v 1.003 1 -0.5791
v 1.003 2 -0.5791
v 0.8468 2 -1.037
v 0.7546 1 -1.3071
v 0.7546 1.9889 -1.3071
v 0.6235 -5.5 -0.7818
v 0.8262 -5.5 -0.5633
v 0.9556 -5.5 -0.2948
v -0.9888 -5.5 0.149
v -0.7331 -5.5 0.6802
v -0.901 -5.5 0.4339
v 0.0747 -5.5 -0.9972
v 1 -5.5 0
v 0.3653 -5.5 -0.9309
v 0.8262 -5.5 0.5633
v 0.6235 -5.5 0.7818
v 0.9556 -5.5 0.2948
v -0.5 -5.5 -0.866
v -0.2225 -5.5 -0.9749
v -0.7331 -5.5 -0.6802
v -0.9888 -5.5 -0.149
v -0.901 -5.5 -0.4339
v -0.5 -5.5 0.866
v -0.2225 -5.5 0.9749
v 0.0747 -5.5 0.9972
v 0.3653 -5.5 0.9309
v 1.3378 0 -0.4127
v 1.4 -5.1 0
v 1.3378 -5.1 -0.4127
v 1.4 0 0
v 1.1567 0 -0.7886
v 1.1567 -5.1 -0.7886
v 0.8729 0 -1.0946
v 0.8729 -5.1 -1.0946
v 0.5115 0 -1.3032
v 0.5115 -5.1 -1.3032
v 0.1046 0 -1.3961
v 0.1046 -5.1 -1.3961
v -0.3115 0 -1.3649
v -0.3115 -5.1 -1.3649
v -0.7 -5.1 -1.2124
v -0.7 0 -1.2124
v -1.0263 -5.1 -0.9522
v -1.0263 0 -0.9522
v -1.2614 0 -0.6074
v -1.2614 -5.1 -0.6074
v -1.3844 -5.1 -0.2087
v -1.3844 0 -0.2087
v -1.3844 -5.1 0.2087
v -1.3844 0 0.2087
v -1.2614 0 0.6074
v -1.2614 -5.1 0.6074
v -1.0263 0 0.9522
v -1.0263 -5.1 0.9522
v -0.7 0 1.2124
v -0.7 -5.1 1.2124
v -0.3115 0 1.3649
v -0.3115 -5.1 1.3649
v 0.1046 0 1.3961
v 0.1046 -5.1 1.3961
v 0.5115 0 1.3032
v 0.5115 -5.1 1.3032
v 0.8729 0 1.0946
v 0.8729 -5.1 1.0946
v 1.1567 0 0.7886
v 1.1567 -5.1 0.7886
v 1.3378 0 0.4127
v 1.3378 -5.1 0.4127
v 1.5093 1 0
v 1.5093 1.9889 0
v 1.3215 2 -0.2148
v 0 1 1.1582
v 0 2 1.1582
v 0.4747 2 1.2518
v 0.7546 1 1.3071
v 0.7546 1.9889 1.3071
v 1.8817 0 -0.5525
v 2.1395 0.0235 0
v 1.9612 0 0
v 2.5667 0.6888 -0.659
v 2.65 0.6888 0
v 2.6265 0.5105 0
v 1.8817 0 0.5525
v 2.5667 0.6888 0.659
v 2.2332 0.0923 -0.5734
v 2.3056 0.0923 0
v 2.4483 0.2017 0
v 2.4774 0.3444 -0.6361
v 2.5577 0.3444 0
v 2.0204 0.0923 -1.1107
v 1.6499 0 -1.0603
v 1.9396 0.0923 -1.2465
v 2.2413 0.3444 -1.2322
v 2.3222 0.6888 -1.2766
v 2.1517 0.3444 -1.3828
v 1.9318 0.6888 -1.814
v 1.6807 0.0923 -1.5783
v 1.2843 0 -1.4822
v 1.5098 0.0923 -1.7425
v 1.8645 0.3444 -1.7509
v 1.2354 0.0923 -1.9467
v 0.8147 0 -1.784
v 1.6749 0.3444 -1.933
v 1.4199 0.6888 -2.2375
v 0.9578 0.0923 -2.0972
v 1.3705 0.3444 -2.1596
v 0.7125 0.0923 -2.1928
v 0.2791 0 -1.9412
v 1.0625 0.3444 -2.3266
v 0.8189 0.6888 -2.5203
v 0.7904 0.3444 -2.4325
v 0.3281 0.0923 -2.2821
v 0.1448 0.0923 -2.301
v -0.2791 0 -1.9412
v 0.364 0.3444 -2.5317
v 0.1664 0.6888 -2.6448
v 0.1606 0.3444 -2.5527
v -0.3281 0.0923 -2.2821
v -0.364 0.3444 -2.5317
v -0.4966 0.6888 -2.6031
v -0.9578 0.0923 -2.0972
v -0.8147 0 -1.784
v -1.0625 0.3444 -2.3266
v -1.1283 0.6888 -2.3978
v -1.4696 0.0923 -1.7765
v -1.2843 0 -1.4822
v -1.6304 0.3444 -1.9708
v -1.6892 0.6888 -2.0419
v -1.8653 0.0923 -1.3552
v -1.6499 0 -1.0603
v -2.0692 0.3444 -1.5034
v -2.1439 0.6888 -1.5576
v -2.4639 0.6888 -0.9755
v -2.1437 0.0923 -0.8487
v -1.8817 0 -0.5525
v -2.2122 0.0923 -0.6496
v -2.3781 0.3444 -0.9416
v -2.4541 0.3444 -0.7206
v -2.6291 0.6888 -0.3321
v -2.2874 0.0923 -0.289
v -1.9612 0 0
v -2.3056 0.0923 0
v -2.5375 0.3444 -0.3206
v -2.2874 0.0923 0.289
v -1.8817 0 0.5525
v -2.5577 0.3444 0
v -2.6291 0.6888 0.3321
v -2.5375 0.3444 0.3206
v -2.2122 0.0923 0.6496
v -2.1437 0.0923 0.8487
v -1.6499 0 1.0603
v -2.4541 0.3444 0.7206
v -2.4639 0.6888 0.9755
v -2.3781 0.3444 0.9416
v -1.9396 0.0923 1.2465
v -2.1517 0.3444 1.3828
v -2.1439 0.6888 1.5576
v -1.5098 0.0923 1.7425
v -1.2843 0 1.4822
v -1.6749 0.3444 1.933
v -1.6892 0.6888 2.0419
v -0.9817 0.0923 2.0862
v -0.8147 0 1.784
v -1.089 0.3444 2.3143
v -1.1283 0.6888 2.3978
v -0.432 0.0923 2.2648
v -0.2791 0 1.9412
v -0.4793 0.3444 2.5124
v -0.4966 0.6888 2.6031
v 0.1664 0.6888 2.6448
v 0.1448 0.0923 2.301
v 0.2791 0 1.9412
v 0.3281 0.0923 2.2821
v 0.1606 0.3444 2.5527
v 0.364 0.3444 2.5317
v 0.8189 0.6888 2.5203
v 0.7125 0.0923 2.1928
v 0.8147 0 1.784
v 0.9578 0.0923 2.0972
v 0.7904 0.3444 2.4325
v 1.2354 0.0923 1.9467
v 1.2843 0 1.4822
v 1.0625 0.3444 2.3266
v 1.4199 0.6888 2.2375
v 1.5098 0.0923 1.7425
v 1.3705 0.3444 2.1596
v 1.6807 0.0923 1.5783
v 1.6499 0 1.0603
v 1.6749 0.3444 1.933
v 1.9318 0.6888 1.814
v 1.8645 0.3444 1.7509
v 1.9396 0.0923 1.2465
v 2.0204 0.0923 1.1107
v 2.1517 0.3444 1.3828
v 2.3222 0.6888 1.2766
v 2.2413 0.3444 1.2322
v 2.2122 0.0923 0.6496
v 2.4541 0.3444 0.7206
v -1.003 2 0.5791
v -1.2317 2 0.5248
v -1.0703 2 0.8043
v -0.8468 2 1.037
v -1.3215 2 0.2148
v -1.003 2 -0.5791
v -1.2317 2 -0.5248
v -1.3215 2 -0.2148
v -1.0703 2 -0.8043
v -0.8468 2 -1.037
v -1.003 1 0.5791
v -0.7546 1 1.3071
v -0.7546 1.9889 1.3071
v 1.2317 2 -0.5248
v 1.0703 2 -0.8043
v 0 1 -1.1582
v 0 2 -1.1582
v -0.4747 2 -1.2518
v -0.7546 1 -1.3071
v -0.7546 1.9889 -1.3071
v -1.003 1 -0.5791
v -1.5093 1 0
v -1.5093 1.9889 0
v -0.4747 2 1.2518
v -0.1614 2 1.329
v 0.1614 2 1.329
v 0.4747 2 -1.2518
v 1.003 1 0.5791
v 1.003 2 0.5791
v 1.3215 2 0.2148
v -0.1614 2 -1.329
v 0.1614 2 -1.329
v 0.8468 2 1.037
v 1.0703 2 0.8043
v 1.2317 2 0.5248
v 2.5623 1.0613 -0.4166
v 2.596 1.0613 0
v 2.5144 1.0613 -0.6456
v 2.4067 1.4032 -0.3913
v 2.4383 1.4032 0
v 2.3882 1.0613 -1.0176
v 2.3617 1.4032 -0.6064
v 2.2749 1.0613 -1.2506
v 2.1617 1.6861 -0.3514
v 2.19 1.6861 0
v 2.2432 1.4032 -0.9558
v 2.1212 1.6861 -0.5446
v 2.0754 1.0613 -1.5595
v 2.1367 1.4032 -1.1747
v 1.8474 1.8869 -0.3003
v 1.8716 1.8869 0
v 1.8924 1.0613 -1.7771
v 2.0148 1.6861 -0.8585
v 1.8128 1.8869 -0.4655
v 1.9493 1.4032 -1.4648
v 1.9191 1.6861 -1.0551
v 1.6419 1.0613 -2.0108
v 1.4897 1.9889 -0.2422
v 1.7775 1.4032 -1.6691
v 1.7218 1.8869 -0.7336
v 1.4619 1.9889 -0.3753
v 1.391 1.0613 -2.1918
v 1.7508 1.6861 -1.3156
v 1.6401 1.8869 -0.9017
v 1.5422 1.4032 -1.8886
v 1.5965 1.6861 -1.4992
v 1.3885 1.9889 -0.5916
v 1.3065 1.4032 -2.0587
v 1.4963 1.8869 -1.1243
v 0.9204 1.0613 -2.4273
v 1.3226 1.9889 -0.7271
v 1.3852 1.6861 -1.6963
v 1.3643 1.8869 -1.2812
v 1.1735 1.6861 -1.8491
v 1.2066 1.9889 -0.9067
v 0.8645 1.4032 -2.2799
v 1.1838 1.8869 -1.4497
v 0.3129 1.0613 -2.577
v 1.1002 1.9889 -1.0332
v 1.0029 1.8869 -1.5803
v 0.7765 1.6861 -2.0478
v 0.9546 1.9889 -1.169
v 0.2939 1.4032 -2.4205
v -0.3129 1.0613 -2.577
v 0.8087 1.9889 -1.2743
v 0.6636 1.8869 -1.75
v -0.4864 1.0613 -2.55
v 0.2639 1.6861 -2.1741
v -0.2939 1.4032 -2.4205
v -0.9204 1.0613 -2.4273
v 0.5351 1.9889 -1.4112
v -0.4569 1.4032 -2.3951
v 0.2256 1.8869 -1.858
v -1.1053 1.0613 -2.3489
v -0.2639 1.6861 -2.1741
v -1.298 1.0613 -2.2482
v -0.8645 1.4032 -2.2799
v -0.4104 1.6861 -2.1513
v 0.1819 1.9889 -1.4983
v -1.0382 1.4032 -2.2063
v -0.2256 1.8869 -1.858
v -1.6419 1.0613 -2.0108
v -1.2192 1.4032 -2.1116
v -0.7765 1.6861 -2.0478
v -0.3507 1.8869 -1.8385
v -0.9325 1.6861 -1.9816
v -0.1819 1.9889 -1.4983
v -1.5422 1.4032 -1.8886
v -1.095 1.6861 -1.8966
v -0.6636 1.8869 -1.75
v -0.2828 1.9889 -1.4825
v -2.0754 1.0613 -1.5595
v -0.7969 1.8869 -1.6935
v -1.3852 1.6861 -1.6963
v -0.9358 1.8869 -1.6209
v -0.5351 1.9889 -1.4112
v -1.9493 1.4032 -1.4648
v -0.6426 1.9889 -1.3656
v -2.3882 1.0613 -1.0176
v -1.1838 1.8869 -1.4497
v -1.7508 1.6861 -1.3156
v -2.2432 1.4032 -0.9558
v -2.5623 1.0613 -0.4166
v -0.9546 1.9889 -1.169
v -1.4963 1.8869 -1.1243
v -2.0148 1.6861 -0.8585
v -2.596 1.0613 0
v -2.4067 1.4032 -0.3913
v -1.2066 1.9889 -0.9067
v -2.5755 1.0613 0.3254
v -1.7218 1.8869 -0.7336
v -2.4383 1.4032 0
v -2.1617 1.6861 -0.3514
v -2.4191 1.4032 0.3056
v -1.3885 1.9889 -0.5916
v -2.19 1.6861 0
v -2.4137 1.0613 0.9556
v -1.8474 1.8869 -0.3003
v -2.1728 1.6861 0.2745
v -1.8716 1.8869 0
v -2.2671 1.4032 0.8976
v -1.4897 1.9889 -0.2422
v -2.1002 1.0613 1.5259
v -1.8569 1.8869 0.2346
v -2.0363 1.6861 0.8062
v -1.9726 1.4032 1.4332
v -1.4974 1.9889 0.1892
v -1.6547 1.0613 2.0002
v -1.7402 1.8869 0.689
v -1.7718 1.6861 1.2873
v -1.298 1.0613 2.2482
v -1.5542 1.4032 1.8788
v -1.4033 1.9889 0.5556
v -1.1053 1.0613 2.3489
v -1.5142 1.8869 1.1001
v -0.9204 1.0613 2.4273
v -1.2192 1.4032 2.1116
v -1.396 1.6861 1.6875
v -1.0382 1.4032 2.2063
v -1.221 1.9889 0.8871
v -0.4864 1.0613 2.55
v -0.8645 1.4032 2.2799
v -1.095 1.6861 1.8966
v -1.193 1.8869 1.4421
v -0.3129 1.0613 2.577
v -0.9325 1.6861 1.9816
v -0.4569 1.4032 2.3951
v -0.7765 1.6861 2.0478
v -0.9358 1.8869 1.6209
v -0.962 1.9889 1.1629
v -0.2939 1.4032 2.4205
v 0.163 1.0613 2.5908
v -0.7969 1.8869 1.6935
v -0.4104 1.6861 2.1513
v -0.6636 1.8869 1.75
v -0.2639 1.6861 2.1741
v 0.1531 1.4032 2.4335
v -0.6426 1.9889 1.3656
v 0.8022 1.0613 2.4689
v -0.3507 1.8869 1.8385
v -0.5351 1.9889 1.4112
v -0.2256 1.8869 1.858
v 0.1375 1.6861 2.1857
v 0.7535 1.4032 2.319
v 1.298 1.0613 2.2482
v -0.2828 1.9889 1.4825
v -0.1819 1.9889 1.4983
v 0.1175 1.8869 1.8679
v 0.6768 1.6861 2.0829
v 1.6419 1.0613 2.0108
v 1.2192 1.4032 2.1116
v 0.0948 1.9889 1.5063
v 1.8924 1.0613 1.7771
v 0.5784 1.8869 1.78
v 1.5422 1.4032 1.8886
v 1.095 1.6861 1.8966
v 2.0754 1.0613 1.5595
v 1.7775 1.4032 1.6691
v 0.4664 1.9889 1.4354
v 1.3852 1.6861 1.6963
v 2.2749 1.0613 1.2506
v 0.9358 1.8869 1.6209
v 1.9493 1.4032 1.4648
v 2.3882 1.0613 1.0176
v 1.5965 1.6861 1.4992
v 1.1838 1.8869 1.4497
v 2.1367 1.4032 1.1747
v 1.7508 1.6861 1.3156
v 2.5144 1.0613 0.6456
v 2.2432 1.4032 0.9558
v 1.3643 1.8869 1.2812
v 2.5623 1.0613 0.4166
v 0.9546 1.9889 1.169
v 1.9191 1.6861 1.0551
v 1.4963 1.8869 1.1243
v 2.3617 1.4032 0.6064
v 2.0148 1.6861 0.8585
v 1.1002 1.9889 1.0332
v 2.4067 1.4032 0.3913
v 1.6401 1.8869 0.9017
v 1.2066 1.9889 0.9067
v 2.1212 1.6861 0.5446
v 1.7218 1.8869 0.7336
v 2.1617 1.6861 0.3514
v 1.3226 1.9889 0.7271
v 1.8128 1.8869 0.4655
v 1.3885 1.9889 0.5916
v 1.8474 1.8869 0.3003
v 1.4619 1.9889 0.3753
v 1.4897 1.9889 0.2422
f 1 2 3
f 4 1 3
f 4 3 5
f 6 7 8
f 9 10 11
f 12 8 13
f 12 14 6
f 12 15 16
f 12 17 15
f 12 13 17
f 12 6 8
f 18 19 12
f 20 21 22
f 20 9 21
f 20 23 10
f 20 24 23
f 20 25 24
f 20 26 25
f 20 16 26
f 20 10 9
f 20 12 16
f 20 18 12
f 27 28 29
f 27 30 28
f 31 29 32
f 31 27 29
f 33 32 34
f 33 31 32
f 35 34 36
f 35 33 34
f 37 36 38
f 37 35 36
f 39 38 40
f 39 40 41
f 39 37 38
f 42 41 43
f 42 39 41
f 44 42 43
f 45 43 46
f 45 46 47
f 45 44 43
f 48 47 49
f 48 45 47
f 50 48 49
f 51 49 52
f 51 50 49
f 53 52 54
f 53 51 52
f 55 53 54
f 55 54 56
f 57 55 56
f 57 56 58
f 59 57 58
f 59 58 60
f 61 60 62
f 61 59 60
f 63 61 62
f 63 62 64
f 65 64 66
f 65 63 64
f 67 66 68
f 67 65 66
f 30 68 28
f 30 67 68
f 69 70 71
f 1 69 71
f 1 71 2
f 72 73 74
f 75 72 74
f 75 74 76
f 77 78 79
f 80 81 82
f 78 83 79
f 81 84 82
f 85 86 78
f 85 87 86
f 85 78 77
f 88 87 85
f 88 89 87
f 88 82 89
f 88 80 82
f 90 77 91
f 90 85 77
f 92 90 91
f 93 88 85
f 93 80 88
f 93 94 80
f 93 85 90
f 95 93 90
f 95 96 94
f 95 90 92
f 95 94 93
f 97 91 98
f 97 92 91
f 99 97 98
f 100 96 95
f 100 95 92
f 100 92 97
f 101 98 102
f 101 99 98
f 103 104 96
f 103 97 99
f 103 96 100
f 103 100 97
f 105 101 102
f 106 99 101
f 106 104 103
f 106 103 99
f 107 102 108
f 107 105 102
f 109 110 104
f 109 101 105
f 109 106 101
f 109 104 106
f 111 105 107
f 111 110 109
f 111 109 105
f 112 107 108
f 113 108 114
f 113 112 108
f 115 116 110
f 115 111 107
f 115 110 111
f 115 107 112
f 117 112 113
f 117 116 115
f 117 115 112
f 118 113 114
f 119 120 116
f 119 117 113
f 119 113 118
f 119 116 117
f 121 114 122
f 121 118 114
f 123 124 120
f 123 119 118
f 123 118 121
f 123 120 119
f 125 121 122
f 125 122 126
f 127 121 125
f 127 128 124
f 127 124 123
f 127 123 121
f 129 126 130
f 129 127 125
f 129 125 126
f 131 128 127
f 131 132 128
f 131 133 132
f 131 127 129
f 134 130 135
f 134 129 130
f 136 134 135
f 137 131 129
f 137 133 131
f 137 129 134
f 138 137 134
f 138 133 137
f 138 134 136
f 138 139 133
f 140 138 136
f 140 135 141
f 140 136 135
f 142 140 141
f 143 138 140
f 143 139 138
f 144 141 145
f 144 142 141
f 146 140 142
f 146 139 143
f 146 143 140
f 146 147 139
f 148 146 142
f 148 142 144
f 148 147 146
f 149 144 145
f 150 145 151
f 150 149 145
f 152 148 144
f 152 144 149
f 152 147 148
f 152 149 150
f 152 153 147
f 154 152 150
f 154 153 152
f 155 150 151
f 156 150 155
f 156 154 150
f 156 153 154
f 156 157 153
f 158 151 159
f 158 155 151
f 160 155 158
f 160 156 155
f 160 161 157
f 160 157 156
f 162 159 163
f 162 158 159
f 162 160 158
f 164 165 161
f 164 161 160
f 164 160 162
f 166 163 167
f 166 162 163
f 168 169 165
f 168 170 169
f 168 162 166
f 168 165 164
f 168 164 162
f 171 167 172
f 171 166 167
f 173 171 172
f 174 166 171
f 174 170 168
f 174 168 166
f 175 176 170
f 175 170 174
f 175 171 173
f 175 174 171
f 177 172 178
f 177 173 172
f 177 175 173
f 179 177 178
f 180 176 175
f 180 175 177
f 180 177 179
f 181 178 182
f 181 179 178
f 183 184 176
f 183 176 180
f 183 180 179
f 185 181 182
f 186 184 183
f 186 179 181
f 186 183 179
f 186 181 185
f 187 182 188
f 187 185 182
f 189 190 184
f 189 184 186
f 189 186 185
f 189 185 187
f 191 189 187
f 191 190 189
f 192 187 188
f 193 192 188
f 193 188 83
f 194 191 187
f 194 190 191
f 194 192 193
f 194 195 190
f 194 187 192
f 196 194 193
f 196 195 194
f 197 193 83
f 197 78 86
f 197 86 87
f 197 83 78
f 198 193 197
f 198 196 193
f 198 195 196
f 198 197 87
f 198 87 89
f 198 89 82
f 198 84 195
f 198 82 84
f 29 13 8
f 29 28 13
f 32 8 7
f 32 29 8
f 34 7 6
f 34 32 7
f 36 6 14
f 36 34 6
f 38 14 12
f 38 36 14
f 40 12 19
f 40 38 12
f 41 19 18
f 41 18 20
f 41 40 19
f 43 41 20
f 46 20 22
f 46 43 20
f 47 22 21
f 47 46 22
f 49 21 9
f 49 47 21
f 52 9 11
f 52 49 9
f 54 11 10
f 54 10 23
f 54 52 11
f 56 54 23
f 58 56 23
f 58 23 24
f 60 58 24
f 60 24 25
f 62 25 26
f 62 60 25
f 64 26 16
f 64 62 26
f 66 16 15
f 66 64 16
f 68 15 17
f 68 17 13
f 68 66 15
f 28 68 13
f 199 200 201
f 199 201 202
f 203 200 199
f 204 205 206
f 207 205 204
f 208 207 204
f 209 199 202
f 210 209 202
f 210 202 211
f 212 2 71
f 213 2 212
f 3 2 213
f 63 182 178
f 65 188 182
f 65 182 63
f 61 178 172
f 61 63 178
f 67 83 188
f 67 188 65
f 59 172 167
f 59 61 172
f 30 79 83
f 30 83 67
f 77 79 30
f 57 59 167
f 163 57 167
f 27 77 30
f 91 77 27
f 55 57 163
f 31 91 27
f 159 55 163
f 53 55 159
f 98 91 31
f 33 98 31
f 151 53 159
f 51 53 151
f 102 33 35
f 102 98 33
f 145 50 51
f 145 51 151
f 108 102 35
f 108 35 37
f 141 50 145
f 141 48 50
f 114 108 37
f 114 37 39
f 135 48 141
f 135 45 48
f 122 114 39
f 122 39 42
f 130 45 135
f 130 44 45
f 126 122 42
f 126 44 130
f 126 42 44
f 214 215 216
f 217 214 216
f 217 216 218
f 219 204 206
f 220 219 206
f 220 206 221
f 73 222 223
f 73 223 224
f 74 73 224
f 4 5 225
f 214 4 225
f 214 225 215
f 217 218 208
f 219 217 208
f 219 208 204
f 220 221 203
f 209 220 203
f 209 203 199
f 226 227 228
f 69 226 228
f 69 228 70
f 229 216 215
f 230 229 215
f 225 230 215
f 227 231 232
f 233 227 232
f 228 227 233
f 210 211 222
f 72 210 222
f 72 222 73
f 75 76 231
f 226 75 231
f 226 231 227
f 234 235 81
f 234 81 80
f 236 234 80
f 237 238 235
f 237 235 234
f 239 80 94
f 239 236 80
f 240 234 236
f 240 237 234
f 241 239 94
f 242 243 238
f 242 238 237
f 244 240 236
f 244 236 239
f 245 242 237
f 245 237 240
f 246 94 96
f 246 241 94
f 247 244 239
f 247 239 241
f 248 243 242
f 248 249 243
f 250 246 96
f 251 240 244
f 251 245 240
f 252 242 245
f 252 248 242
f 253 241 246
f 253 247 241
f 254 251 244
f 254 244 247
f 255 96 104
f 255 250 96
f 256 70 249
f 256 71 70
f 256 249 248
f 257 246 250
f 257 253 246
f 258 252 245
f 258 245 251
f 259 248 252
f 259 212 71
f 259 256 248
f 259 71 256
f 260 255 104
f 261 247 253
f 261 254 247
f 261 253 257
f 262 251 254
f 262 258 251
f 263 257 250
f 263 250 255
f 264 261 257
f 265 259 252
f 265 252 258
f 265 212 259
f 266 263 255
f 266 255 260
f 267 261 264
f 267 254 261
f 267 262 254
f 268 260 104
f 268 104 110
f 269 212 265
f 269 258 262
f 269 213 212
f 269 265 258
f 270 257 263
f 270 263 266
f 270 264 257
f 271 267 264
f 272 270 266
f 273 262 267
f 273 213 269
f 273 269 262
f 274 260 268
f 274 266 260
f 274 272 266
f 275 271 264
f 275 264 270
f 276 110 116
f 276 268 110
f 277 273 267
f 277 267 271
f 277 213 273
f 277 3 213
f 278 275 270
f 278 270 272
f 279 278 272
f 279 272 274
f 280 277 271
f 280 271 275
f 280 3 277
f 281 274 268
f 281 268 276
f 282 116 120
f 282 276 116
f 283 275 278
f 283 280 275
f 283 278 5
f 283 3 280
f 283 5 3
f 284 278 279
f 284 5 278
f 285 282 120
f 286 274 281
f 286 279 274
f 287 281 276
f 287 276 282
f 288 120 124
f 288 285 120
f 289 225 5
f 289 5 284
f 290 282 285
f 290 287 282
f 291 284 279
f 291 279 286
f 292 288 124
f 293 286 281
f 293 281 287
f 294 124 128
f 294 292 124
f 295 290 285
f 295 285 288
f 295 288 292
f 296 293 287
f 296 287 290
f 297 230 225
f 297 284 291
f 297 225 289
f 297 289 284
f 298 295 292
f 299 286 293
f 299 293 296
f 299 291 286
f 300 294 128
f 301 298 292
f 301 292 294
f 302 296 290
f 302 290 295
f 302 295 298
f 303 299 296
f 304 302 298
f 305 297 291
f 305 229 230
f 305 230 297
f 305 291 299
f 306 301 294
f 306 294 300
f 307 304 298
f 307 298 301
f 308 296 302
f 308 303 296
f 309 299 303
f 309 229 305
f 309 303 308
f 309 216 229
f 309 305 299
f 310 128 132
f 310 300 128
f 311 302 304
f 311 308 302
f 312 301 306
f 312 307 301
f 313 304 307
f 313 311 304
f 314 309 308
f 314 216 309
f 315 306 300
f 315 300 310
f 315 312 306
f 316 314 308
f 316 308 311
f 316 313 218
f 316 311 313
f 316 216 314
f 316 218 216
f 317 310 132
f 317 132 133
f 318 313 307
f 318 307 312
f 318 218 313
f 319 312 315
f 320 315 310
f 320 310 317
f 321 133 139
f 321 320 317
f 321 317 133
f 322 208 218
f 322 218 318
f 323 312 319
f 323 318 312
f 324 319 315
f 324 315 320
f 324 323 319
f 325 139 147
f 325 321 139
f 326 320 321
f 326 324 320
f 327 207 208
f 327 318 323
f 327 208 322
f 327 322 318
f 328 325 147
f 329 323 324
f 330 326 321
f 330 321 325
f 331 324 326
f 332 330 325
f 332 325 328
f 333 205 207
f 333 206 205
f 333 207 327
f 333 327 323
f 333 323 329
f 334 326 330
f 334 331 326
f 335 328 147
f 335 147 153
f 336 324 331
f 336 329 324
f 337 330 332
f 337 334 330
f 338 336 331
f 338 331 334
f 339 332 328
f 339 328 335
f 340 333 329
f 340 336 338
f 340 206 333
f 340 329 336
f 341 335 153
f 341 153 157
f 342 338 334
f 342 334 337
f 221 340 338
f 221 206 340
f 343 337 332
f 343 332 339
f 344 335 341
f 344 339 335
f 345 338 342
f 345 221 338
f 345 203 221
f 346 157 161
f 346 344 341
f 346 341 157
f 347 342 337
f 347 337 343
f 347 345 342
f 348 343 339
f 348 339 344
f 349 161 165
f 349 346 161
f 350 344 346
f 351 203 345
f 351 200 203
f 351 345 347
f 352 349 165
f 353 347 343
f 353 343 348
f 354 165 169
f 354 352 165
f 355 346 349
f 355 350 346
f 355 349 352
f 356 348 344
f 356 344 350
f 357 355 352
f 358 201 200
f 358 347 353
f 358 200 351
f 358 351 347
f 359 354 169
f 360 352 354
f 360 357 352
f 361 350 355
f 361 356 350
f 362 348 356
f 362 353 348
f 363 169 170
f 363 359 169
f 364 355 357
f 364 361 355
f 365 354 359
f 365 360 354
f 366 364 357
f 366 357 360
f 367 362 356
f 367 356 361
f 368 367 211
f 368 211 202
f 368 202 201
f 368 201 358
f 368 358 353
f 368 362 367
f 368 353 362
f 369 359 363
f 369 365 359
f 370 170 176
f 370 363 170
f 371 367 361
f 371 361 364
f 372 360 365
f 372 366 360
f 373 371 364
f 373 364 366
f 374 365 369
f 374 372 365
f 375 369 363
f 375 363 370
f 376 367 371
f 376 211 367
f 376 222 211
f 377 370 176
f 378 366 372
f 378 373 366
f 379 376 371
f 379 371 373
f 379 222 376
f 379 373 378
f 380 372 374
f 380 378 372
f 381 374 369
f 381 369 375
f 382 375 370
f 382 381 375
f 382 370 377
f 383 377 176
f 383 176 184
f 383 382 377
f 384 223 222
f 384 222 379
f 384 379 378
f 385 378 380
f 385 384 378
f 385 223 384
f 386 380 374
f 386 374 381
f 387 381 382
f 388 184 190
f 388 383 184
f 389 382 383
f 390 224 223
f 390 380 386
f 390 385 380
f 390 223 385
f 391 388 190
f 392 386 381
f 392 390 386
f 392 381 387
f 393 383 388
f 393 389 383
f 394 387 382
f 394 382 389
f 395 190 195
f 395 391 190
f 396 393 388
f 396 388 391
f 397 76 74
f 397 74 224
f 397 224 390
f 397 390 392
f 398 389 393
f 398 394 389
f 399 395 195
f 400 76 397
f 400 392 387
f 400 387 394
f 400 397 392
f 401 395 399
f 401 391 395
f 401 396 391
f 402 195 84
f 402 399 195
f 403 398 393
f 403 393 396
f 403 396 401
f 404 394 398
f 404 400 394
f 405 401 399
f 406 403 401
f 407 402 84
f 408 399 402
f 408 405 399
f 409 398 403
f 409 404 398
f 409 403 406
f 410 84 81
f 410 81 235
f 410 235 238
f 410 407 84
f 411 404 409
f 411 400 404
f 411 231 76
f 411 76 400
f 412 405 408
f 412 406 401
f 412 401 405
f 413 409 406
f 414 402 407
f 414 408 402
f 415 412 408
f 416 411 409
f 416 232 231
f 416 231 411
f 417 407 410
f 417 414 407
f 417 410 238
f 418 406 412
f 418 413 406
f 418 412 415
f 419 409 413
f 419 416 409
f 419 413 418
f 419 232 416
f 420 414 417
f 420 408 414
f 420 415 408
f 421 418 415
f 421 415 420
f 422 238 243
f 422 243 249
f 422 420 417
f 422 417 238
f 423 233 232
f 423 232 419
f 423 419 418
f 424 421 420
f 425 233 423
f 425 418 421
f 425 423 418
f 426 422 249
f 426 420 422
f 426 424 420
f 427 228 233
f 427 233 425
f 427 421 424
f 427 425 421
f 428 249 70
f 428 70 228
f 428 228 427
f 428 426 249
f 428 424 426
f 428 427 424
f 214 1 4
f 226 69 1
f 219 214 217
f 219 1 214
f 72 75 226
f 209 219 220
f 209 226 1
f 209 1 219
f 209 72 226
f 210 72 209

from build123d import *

# Parameters (mm, degrees)
POCKET_DEPTH = 1


with BuildPart() as part:
    # Sketch → Revolution (revolve)
    with BuildSketch(Plane.XY):
        with BuildLine():
            Line((0, -5.5), (1, -5.5))
            Line((1, -5.5), (1.4, -5.1))
            Line((1.4, -5.1), (1.4, 0))
            Line((1.4, 0), (1.961192, 0))
            ThreePointArc((1.961192, 0), (2.448253, 0.201747), (2.65, 0.688808))
            ThreePointArc((2.65, 0.688808), (2.265961, 1.615961), (1.338808, 2))
            Line((1.338808, 2), (0, 2))
            Line((0, 2), (0, -5.5))
        make_face()
    revolve(axis=Axis((0, 0, 0), (0, 1, 0)))

    # Sketch001 (on Face7 of Revolution) → Pocket (cut)
    with BuildSketch(Plane(origin=(0, 2, 0), x_dir=(-1, 0, 0), z_dir=(0, 1, 0))):
        Polygon((0.754634, 1.307064), (0, 1.158183), (-0.754634, 1.307064), (-1.003016, 0.579091), (-1.509267, 0), (-1.003016, -0.579091), (-0.754634, -1.307064), (0, -1.158183), (0.754634, -1.307064), (1.003016, -0.579091), (1.509267, 0), (1.003016, 0.579091), align=None)
    extrude(amount=-POCKET_DEPTH, mode=Mode.SUBTRACT)


solid = part.part
